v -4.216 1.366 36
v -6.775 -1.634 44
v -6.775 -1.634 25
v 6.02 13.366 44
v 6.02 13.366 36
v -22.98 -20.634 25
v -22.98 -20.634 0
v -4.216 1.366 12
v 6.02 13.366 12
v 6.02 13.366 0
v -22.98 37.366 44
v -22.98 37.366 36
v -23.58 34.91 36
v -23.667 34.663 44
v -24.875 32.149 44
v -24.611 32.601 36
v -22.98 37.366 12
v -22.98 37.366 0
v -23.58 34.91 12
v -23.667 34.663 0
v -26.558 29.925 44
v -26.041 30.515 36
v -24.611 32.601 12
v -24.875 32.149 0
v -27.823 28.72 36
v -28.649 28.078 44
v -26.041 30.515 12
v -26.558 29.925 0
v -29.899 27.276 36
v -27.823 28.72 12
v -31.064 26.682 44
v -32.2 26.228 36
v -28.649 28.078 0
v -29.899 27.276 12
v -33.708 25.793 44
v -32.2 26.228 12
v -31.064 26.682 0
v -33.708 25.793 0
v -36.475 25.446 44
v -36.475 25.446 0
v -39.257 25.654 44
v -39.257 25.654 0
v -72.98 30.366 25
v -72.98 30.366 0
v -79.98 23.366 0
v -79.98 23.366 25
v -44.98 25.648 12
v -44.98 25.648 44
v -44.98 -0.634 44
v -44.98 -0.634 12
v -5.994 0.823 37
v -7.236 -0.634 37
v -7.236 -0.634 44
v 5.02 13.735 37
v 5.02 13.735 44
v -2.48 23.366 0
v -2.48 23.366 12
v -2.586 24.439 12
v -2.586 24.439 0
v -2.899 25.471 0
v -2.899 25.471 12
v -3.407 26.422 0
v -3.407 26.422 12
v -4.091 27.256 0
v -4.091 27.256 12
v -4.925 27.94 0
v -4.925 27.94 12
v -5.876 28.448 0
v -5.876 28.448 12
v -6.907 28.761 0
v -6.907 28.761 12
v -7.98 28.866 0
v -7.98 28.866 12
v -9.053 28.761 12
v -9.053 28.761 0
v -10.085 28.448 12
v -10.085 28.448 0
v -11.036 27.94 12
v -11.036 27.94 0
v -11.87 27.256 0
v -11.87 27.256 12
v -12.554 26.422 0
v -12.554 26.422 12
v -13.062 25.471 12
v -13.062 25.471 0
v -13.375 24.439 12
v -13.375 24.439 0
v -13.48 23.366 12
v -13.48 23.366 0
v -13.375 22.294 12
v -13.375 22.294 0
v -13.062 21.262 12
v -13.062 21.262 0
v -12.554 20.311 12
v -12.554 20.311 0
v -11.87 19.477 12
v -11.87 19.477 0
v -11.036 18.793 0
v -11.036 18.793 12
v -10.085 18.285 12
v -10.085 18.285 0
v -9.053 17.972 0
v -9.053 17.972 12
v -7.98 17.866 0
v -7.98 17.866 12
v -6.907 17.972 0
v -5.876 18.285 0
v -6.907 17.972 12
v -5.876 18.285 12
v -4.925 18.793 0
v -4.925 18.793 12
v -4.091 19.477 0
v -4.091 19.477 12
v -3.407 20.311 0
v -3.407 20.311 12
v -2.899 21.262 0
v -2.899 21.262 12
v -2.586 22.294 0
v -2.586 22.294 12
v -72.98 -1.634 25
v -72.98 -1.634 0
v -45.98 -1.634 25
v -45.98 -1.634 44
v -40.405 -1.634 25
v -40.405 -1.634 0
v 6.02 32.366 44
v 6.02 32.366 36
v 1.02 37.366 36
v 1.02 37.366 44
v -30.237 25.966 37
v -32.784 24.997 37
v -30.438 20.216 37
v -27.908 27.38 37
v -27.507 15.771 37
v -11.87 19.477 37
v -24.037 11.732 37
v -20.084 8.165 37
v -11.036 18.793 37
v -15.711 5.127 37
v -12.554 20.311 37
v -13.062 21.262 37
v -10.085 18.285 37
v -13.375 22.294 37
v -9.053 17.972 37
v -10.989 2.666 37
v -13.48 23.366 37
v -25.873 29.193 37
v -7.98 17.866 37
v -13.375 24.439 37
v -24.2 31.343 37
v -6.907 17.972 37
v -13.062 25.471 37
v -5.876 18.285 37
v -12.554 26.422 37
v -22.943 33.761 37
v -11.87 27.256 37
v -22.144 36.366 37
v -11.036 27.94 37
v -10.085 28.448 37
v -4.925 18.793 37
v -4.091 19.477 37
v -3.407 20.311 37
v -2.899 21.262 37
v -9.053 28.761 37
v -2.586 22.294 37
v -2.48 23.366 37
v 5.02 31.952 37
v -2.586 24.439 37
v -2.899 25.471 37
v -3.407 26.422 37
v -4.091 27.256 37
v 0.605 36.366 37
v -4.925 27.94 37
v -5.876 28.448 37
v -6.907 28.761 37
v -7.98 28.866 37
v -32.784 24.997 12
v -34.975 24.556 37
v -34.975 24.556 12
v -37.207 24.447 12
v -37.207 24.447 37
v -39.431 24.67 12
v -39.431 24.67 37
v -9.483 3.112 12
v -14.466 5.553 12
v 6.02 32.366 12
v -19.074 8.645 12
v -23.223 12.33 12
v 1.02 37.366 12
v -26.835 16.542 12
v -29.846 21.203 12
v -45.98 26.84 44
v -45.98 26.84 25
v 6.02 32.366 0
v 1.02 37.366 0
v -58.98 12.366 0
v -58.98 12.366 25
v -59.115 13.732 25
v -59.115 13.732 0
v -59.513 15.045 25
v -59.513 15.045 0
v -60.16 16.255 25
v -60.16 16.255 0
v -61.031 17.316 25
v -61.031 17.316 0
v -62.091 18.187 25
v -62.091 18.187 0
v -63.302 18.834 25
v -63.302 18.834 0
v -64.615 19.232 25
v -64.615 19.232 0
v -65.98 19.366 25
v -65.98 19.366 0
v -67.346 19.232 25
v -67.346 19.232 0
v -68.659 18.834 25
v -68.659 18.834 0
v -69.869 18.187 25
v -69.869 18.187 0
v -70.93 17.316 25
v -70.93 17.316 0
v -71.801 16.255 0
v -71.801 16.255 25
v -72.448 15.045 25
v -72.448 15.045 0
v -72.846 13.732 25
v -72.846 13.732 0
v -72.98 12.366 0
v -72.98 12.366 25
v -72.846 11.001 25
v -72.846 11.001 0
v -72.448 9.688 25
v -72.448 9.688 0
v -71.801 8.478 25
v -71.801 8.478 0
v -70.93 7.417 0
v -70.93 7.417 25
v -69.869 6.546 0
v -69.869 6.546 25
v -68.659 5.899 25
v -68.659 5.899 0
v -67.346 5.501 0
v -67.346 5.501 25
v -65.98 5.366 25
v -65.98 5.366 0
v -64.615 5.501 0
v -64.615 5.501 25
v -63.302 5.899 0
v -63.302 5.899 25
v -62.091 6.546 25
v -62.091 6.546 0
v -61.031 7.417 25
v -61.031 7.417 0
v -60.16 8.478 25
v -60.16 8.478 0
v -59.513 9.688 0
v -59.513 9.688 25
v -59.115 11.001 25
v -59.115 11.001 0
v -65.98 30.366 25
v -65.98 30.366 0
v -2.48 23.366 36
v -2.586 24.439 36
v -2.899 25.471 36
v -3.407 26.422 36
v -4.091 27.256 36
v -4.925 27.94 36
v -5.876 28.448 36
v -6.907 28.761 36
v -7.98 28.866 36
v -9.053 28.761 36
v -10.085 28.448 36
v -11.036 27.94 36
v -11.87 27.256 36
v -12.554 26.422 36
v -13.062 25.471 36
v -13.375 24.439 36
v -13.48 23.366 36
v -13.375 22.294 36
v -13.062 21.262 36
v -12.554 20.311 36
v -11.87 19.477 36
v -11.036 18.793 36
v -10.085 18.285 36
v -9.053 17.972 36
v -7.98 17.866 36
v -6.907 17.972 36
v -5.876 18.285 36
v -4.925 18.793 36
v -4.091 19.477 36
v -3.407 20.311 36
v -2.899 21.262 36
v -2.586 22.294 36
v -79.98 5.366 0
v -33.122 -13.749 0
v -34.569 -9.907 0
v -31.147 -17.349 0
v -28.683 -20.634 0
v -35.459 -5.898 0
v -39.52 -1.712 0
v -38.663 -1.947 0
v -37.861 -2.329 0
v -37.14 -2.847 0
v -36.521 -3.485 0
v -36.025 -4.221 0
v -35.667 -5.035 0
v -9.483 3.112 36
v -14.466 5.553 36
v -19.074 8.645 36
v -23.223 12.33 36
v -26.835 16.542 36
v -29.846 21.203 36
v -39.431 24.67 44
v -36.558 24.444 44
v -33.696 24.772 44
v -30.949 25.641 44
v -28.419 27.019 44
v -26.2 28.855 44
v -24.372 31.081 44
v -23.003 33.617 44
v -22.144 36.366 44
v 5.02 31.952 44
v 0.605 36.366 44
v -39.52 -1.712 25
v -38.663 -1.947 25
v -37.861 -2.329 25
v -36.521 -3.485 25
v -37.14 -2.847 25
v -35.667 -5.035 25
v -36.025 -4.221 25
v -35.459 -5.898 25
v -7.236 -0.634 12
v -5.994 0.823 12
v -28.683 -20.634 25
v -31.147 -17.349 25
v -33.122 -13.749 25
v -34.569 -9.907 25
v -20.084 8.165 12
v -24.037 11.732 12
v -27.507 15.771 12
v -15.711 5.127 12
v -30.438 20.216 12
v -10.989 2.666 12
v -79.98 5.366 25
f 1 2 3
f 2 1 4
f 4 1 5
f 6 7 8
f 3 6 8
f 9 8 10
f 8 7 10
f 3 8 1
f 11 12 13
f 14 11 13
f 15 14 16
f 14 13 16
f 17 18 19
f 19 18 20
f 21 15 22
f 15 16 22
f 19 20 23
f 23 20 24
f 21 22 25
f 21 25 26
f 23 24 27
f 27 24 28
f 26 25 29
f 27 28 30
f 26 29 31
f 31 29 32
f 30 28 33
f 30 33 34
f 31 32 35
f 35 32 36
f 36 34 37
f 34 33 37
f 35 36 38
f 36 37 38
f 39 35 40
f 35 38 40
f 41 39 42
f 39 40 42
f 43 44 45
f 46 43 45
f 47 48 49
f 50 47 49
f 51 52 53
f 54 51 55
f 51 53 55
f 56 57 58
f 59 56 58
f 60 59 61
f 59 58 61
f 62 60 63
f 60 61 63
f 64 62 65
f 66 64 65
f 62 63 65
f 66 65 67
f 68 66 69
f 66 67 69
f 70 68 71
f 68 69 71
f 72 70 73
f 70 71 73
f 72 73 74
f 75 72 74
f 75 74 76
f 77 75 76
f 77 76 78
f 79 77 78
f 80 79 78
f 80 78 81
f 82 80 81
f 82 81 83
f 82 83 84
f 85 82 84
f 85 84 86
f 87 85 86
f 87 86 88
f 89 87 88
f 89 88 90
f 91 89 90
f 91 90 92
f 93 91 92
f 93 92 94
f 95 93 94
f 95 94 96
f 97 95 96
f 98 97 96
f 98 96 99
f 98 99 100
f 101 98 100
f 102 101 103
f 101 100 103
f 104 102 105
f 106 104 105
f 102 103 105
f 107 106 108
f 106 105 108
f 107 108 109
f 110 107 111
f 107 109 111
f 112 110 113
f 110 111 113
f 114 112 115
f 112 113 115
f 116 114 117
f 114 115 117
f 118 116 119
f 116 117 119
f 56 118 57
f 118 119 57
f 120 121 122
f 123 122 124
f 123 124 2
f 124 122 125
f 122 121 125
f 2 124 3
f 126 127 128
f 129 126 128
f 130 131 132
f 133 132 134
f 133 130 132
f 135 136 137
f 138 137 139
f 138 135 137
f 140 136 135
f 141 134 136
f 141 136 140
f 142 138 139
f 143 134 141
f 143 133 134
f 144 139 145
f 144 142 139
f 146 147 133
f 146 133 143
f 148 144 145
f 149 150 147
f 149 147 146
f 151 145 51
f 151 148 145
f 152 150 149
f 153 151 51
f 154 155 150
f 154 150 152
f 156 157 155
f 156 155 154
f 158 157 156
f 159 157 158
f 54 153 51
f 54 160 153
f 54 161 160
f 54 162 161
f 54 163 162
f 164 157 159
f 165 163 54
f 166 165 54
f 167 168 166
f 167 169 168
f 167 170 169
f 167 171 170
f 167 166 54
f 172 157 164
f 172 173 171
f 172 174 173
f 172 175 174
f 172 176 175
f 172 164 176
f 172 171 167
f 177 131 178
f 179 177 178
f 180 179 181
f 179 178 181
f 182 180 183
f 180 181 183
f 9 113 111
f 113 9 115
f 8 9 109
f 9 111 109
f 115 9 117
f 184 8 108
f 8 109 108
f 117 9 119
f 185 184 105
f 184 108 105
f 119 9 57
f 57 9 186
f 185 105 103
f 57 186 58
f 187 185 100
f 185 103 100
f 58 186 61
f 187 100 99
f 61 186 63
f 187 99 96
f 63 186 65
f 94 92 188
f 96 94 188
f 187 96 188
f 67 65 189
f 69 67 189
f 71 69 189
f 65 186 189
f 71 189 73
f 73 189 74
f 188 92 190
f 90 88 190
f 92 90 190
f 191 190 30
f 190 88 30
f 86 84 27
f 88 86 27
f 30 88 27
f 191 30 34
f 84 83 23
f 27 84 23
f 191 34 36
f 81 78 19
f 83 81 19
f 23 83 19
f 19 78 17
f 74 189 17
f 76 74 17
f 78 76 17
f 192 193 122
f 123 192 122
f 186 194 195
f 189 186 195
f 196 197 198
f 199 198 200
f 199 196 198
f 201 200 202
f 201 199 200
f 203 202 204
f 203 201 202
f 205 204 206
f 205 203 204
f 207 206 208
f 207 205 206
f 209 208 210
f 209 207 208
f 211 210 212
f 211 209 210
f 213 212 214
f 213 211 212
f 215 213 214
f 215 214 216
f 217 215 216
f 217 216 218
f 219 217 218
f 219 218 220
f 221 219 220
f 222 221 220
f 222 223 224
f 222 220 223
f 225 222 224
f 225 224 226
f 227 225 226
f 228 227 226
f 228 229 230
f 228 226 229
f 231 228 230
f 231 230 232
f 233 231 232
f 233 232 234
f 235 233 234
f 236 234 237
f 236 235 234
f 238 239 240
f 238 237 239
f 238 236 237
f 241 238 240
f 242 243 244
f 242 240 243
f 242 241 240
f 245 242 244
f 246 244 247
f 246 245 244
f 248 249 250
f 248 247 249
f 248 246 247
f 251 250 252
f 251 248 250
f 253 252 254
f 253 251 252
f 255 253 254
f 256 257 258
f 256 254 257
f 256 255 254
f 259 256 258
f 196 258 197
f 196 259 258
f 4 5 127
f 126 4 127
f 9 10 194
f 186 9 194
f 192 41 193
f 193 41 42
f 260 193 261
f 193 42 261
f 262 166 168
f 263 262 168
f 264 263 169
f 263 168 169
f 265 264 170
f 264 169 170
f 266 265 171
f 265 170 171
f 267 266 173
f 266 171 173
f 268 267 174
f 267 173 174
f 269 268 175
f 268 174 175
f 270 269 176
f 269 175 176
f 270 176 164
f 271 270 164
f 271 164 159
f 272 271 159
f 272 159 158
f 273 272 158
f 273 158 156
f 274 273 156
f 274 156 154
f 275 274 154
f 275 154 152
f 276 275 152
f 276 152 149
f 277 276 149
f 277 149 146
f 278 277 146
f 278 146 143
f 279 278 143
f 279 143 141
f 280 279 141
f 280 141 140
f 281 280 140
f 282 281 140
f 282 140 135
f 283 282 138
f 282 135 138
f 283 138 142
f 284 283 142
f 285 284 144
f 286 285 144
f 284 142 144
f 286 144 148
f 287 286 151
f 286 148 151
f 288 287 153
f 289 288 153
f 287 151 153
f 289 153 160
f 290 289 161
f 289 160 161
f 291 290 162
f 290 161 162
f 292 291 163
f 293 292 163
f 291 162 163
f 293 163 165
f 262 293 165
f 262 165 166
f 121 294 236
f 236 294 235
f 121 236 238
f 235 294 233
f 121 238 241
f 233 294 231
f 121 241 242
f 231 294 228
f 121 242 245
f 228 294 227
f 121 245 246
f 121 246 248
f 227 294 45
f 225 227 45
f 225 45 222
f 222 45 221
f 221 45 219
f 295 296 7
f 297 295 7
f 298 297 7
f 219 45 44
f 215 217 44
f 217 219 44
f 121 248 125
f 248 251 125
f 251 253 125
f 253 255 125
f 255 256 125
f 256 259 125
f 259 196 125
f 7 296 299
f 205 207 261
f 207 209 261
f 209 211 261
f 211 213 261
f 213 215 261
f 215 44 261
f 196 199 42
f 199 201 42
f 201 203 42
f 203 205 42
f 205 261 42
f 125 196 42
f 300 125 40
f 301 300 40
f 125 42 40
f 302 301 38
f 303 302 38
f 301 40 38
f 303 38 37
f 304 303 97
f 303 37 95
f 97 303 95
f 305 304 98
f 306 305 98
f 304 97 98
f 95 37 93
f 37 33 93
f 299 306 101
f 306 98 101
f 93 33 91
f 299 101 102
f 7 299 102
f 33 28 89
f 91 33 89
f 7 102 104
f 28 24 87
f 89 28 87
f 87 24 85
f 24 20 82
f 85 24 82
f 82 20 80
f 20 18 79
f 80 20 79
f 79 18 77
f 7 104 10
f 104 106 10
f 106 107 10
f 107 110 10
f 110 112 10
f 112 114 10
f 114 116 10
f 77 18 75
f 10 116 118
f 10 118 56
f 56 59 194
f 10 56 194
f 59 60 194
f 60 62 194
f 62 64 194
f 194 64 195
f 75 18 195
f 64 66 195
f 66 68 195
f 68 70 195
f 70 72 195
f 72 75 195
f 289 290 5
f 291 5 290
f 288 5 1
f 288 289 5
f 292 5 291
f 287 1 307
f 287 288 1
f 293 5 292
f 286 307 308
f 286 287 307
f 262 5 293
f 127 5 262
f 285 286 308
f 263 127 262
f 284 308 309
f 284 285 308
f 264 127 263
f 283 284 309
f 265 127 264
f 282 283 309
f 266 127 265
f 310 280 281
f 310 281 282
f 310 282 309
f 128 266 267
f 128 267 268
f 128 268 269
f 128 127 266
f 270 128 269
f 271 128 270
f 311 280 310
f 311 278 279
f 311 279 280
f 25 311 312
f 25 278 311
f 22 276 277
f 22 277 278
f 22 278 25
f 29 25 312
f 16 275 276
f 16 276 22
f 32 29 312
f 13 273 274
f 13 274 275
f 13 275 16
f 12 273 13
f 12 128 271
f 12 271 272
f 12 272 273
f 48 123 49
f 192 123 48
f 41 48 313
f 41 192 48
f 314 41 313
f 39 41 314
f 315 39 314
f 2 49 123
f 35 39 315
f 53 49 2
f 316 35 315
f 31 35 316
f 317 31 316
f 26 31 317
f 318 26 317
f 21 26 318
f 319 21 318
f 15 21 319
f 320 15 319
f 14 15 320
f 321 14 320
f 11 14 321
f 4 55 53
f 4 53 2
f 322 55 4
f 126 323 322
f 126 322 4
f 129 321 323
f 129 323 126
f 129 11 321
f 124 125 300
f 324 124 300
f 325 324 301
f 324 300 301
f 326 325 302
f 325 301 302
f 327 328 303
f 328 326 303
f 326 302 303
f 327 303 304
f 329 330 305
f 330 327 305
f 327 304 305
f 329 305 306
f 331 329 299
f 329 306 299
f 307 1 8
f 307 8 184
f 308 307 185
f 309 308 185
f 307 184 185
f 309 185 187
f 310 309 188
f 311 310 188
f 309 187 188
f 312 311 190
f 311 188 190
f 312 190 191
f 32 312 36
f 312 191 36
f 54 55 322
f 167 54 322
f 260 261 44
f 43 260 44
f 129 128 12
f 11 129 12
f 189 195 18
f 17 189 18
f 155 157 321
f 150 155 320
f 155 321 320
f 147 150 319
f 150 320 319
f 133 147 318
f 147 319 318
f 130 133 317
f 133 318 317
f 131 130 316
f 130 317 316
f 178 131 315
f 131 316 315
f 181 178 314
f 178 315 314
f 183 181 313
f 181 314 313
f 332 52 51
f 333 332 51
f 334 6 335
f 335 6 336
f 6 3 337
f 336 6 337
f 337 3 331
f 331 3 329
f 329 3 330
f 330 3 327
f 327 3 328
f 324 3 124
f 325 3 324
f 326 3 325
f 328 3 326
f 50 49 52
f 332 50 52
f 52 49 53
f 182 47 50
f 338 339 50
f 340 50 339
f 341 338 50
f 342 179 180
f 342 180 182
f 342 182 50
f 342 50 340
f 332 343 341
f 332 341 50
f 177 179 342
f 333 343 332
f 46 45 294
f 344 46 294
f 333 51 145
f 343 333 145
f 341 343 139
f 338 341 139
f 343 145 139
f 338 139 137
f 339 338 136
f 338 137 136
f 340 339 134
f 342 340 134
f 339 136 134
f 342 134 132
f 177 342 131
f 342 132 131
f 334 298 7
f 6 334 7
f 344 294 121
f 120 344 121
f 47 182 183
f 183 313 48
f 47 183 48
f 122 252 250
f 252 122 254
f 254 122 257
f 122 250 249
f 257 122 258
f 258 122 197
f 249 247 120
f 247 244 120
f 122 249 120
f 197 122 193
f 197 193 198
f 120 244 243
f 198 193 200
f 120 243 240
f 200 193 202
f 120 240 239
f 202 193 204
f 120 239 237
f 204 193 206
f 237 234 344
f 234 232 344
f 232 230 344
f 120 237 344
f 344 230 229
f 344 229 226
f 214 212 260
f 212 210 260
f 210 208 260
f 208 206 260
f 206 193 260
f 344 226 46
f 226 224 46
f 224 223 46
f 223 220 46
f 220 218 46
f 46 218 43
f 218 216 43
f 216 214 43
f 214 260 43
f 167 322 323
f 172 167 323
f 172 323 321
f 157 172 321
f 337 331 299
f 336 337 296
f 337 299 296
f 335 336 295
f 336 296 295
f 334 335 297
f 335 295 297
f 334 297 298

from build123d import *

# Parameters (mm, degrees)
SKETCH1_R           = 7
BOSS_EXTRUDE1_DEPTH = 44
SKETCH2_R           = 5.5
CUT_EXTRUDE1_DEPTH  = 99.636339936
CUT_EXTRUDE2_START  = -19
CUT_EXTRUDE2_DEPTH  = 19
CUT_EXTRUDE3_DEPTH  = 24
CUT_EXTRUDE4_DEPTH  = 7
CUT_EXTRUDE5_DEPTH  = 25


with BuildPart() as part:
    # Sketch1 → Boss-Extrude1 (new body)
    with BuildSketch(Plane.XY):
        with BuildLine():
            ThreePointArc((-40.404910175, -1.633500031), (-37.139674394, -2.846913799), (-35.459271434, -5.898205914))
            ThreePointArc((-35.459271434, -5.898205914), (-33.122441231, -13.749172092), (-28.683469034, -20.633500031))
            Line((-28.683469034, -20.633500031), (-22.980449087, -20.633500031))
            Line((-22.980449087, -20.633500031), (6.019550913, 13.366499969))
            Line((6.019550913, 13.366499969), (6.019550913, 32.366499969))
            Line((6.019550913, 32.366499969), (1.019550913, 37.366499969))
            Line((1.019550913, 37.366499969), (-22.980449087, 37.366499969))
            ThreePointArc((-22.980449087, 37.366499969), (-28.648710625, 28.077944899), (-39.256864445, 25.654410975))
            Line((-39.256864445, 25.654410975), (-65.980449087, 30.366499969))
            Line((-65.980449087, 30.366499969), (-72.980449087, 30.366499969))
            Line((-72.980449087, 30.366499969), (-79.980449087, 23.366499969))
            Line((-79.980449087, 23.366499969), (-79.980449087, 5.366499969))
            Line((-79.980449087, 5.366499969), (-72.980449087, -1.633500031))
            Line((-72.980449087, -1.633500031), (-40.404910175, -1.633500031))
        make_face()
        with Locations((-65.980449087, 12.366499969)):
            Circle(SKETCH1_R, mode=Mode.SUBTRACT)
    extrude(amount=BOSS_EXTRUDE1_DEPTH)

    # Sketch2 → Cut-Extrude1 (cut, through all)
    with BuildSketch(Plane.XY.offset(44)):
        with Locations((-7.980449087, 23.366499969)):
            Circle(SKETCH2_R)
    extrude(amount=-CUT_EXTRUDE1_DEPTH, mode=Mode.SUBTRACT)

    # Sketch3 → Cut-Extrude2 (cut)
    with BuildSketch(Plane.XY.offset(44).offset(CUT_EXTRUDE2_START)):
        Polygon((-45.980449087, 26.839960355), (-45.980449087, -1.633500031), (-72.980449087, -1.633500031), (-79.980449087, 5.366499969), (-79.980449087, 23.366499969), (-72.980449087, 30.366499969), (-65.980449087, 30.366499969), align=None)
        with BuildLine():
            Line((-40.404910175, -1.633500031), (-6.774566734, -1.633500031))
            Line((-6.774566734, -1.633500031), (-22.980449087, -20.633500031))
            Line((-22.980449087, -20.633500031), (-28.683469034, -20.633500031))
            ThreePointArc((-28.683469034, -20.633500031), (-33.122441231, -13.749172092), (-35.459271434, -5.898205914))
            ThreePointArc((-35.459271434, -5.898205914), (-37.139674394, -2.846913799), (-40.404910175, -1.633500031))
        make_face()
    extrude(amount=CUT_EXTRUDE2_DEPTH, mode=Mode.SUBTRACT)

    # Sketch7 → Cut-Extrude3 (cut)
    with BuildSketch(Plane(origin=(0, 0, 12), x_dir=(-1, 0, 0), z_dir=(0, 0, -1))):
        with BuildLine():
            Line((-6.019550913, 13.366499969), (4.215743204, 1.366499969))
            ThreePointArc((4.215743204, 1.366499969), (21.210918642, 10.417084234), (32.200340902, 26.227892629))
            ThreePointArc((32.200340902, 26.227892629), (26.041094158, 30.514775107), (22.980449087, 37.366499969))
            Line((22.980449087, 37.366499969), (-1.019550913, 37.366499969))
            Line((-1.019550913, 37.366499969), (-6.019550913, 32.366499969))
            Line((-6.019550913, 32.366499969), (-6.019550913, 13.366499969))
        make_face()
    extrude(amount=-CUT_EXTRUDE3_DEPTH, mode=Mode.SUBTRACT)

    # Sketch8 → Cut-Extrude4 (cut)
    with BuildSketch(Plane.XY.offset(44)):
        with BuildLine():
            Line((-44.980449087, 25.648206762), (-44.980449087, -0.633500031))
            Line((-44.980449087, -0.633500031), (-7.235972791, -0.633500031))
            Line((-7.235972791, -0.633500031), (5.019550913, 13.735045001))
            Line((5.019550913, 13.735045001), (5.019550913, 31.952286406))
            Line((5.019550913, 31.952286406), (0.605337351, 36.366499969))
            Line((0.605337351, 36.366499969), (-22.144406347, 36.366499969))
            ThreePointArc((-22.144406347, 36.366499969), (-28.419495692, 27.018587194), (-39.430512622, 24.669603222))
            Line((-39.430512622, 24.669603222), (-44.980449087, 25.648206762))
        make_face()
    extrude(amount=-CUT_EXTRUDE4_DEPTH, mode=Mode.SUBTRACT)

    # Sketch12 → Cut-Extrude5 (cut)
    with BuildSketch(Plane.XY.offset(37)):
        with BuildLine():
            Line((-7.235972791, -0.633500031), (-5.99360134, 0.823073394))
            ThreePointArc((-5.99360134, 0.823073394), (-22.117044704, 9.886135078), (-32.783766787, 24.996580242))
            ThreePointArc((-32.783766787, 24.996580242), (-36.088777964, 24.459836681), (-39.430512622, 24.669603222))
            Line((-39.430512622, 24.669603222), (-44.980449087, 25.648206762))
            Line((-44.980449087, 25.648206762), (-44.980449087, -0.633500031))
            Line((-44.980449087, -0.633500031), (-7.235972791, -0.633500031))
        make_face()
    extrude(amount=-CUT_EXTRUDE5_DEPTH, mode=Mode.SUBTRACT)


solid = part.part
